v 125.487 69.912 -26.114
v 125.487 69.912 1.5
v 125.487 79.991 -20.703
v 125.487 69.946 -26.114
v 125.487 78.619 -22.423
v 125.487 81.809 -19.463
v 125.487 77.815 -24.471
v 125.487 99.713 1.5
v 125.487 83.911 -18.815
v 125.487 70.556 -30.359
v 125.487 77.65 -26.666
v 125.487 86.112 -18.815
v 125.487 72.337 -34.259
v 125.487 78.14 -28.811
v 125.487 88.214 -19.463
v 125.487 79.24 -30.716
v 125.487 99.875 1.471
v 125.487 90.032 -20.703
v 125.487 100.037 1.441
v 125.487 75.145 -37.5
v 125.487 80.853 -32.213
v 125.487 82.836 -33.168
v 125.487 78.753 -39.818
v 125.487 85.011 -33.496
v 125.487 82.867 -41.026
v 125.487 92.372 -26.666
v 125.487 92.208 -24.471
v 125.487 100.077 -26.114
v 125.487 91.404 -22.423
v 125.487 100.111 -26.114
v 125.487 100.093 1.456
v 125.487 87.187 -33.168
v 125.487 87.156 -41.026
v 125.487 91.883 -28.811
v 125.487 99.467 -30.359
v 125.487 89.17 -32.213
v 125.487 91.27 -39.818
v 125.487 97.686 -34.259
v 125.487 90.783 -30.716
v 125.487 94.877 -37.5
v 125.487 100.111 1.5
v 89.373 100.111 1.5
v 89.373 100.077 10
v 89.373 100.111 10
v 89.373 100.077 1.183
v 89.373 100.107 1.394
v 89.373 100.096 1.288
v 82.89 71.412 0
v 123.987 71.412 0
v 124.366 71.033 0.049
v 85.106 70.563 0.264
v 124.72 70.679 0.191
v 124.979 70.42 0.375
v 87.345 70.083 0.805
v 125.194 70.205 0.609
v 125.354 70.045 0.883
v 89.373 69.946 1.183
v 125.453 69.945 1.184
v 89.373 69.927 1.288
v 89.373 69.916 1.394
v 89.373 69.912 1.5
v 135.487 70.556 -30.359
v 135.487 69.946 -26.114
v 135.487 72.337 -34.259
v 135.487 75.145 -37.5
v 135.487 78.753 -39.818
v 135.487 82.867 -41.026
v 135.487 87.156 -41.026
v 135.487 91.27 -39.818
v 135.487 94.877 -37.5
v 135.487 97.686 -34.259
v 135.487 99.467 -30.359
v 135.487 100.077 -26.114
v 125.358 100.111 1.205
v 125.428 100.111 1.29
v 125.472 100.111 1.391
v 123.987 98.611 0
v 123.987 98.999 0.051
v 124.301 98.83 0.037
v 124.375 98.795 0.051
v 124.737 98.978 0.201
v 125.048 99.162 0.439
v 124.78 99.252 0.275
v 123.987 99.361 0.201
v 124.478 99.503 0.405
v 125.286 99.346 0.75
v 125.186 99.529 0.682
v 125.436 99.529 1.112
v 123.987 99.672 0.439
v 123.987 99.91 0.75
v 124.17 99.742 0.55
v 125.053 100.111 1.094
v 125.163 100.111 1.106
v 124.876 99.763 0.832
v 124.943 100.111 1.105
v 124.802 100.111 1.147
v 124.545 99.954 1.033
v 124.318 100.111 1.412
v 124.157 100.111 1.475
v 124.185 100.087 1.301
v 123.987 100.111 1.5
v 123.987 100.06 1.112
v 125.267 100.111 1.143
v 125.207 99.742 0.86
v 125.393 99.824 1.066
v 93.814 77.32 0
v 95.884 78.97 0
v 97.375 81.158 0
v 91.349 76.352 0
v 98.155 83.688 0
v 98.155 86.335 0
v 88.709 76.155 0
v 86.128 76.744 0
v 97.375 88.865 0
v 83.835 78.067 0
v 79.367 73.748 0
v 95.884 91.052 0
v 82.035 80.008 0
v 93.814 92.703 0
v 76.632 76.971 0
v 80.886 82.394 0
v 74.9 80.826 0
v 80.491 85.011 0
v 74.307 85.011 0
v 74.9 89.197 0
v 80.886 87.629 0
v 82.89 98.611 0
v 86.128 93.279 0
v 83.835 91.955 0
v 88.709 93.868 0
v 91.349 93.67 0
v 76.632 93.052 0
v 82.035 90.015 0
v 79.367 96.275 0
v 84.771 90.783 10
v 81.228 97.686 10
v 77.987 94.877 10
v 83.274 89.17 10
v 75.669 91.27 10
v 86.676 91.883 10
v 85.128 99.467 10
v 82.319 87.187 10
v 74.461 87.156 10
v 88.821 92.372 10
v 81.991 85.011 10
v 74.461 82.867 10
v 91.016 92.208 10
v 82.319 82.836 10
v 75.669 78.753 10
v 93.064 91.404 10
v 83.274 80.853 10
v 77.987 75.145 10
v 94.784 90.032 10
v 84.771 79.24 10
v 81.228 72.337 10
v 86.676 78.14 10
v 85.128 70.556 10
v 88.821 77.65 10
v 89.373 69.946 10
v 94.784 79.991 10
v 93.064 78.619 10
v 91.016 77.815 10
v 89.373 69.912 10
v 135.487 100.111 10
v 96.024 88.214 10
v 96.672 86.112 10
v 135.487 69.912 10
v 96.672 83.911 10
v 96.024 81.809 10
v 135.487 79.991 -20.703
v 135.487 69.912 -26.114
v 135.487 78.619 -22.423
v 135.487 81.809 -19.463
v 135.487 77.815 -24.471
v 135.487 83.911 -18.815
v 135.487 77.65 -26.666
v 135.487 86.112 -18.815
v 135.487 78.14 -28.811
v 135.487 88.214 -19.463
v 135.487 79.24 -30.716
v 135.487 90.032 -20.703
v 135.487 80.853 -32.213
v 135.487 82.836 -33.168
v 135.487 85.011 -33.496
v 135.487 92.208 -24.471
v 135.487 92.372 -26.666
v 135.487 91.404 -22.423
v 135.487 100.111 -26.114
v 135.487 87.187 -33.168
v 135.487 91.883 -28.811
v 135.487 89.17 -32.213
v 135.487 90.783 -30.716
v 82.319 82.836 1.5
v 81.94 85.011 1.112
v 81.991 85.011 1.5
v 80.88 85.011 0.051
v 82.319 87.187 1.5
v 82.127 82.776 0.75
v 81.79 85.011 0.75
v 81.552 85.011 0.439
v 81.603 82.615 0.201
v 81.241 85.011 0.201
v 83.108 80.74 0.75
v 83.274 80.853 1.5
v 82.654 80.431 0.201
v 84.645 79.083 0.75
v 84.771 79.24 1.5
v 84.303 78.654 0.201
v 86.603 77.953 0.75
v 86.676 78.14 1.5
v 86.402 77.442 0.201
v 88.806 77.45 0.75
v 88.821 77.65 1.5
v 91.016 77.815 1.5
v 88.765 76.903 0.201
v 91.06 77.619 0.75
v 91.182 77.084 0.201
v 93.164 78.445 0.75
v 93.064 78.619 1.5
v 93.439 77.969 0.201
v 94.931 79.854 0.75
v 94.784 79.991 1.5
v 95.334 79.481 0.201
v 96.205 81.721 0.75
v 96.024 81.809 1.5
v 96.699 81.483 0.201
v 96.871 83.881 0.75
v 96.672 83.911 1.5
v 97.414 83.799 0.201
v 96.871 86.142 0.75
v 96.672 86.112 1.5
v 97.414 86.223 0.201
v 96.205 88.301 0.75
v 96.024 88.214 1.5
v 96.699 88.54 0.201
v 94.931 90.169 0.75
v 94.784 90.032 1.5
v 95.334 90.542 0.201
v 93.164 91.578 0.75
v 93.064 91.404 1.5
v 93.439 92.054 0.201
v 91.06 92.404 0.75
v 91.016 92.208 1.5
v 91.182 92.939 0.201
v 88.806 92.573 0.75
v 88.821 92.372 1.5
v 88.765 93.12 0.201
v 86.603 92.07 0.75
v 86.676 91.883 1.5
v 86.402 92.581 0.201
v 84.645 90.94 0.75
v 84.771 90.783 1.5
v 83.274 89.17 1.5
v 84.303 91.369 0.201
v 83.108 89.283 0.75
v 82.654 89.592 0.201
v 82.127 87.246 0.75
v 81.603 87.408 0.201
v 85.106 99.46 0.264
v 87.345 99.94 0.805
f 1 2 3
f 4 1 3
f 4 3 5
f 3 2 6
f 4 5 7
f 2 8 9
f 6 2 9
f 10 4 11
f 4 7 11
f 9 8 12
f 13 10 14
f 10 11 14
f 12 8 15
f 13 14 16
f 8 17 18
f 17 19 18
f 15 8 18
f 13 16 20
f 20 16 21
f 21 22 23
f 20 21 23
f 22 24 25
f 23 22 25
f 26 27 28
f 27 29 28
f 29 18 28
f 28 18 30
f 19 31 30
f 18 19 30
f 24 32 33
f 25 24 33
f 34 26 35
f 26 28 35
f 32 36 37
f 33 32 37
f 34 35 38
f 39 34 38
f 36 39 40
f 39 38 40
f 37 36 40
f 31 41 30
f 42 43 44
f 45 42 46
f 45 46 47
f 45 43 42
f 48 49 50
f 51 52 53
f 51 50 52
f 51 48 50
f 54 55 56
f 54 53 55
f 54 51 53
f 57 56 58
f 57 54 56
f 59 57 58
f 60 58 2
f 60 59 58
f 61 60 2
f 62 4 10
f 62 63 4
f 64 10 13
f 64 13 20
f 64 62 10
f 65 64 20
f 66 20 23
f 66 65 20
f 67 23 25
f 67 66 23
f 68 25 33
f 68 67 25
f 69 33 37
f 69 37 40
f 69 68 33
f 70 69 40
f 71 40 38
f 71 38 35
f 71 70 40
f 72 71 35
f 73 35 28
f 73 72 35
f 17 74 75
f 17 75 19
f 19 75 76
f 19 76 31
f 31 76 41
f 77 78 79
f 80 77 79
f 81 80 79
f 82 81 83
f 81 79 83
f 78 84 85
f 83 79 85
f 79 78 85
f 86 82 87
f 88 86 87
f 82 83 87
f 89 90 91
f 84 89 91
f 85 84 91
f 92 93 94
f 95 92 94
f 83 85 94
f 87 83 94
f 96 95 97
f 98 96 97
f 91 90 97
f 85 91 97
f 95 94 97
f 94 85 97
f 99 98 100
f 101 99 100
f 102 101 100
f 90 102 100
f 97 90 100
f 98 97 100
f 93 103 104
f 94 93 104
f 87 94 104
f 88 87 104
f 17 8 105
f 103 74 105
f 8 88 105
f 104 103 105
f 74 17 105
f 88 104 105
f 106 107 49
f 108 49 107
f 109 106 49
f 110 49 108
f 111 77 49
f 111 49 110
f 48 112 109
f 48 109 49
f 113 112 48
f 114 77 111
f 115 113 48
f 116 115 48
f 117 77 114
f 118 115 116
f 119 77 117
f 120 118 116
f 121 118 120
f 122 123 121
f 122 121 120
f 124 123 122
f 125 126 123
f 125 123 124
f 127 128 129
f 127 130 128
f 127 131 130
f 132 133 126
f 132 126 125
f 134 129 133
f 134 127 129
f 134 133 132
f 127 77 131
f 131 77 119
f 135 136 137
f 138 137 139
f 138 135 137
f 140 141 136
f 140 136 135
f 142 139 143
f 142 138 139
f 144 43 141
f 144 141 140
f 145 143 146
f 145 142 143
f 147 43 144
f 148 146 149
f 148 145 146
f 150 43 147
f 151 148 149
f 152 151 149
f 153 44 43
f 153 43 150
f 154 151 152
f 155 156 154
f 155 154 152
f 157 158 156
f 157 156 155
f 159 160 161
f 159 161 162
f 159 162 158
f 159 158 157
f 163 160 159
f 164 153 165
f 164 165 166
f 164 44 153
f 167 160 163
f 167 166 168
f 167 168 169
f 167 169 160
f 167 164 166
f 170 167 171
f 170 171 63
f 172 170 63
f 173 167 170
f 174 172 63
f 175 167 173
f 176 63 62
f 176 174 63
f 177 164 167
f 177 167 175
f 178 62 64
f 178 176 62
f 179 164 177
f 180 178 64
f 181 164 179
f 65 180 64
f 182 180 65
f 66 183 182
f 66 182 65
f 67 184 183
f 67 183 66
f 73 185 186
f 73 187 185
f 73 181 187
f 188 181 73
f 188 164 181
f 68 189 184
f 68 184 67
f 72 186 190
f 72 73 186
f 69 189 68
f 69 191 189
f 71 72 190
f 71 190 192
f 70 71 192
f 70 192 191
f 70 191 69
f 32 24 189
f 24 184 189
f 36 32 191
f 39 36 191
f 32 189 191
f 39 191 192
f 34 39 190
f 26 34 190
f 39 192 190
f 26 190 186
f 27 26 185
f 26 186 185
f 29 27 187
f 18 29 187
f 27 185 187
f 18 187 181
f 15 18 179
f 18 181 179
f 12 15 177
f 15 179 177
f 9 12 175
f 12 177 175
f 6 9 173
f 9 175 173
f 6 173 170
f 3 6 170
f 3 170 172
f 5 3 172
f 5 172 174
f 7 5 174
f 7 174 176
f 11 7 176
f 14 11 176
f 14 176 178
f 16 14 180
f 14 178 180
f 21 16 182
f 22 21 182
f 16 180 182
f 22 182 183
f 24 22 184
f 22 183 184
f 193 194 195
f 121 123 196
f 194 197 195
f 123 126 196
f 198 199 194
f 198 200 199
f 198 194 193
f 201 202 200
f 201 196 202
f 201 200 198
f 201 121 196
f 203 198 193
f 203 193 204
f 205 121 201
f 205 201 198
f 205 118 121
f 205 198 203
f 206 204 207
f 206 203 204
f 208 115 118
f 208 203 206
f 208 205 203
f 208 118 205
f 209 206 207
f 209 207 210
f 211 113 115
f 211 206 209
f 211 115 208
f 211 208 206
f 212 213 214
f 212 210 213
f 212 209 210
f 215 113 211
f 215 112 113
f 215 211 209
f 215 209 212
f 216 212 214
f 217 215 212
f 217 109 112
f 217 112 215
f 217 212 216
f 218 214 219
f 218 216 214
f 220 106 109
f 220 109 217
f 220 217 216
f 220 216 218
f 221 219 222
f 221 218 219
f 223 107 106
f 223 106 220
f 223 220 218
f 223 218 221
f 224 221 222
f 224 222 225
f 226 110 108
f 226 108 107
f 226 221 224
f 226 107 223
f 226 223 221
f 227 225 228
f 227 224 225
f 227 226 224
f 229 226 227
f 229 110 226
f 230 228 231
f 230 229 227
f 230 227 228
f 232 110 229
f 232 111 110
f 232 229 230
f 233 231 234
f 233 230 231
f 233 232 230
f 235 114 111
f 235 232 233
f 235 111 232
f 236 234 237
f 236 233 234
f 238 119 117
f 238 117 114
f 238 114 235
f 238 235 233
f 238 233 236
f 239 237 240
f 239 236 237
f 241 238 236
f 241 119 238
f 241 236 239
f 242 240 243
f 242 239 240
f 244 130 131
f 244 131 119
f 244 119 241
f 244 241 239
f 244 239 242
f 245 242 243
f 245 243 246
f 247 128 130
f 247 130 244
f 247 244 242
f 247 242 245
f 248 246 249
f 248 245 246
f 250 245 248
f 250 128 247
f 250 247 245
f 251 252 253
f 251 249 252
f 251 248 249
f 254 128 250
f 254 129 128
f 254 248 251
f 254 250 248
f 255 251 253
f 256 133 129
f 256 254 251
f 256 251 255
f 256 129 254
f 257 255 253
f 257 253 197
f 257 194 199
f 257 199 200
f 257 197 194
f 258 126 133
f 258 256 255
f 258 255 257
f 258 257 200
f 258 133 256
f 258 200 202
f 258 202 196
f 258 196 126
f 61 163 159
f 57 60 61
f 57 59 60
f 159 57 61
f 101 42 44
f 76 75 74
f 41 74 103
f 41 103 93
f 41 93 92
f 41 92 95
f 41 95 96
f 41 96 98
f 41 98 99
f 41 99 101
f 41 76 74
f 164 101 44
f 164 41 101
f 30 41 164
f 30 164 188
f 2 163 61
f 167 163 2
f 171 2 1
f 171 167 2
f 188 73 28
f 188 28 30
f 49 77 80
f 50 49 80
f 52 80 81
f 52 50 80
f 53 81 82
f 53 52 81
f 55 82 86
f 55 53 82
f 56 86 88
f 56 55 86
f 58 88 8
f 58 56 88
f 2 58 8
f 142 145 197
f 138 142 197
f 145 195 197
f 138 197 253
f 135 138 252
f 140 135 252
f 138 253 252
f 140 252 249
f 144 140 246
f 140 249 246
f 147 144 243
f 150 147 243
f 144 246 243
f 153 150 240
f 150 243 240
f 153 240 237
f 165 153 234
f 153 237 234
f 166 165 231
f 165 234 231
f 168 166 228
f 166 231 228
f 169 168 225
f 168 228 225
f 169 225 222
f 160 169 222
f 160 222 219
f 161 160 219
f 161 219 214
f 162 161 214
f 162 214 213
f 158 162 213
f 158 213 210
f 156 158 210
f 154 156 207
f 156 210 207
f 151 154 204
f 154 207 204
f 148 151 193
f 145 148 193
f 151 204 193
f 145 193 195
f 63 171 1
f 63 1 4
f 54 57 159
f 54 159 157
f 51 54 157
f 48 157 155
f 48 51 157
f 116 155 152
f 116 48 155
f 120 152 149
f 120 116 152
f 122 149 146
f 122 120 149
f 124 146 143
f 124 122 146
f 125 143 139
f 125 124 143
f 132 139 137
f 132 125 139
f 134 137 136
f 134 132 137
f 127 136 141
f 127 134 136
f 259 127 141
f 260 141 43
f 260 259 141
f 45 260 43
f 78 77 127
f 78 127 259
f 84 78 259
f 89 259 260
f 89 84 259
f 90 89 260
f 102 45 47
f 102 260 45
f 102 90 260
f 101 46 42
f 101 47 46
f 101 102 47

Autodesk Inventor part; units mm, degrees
ref_plane "YZ Plane" through (0, 0, 0) normal (1, 0, 0) x (0, 1, 0)
ref_plane "XZ Plane" through (0, 0, 0) normal (0, 1, 0) x (-1, 0, 0)
ref_plane "XY Plane" through (0, 0, 0) normal (0, 0, 1) x (1, 0, 0)
sketch "Sketch2" plane through (124.0011, 71.4979, 0) normal (0, 0, -1) x (-1, 0, 0)
  line L0 (-1.4859, 28.2151) -> (-1.4859, -1.5861)
  line L1 (-1.4859, -1.5861) -> (34.6281, -1.5861)
  line L2 (34.6281, 28.6132) -> (-1.4859, 28.6132)
  line L3 (-1.4859, 28.6132) -> (-1.4859, 28.2151)
  arc A0 (34.6281, -1.5523) -> (34.6281, 28.5794) centre (34.6281, 13.5135) ccw
  line L4 (34.6281, -1.5861) -> (34.6281, -1.5523)
  line L5 (34.6281, 28.5794) -> (34.6281, 28.6132)
  circle A1 centre (34.6281, 13.5135) radius 7.3816
  point P0 (124.0011, -71.4979)
extrude "Extrusion1" add sketch "Sketch2" against normal blind 10
fillet "Fillet1" radius 1.5 3 edges at (107.43, 100.111, 0) (107.43, 69.9118, 0) (125.487, 84.8124, 0)
fillet "Fillet2" radius 1.5 1 edges at (96.7547, 85.0114, 0)
pattern_circular "Circular Pattern1" count 2 over 270 about axis through (125.487, 69.9118, 10) along (0, 1, 0) of "Extrusion1"
properties part number "90joint"
